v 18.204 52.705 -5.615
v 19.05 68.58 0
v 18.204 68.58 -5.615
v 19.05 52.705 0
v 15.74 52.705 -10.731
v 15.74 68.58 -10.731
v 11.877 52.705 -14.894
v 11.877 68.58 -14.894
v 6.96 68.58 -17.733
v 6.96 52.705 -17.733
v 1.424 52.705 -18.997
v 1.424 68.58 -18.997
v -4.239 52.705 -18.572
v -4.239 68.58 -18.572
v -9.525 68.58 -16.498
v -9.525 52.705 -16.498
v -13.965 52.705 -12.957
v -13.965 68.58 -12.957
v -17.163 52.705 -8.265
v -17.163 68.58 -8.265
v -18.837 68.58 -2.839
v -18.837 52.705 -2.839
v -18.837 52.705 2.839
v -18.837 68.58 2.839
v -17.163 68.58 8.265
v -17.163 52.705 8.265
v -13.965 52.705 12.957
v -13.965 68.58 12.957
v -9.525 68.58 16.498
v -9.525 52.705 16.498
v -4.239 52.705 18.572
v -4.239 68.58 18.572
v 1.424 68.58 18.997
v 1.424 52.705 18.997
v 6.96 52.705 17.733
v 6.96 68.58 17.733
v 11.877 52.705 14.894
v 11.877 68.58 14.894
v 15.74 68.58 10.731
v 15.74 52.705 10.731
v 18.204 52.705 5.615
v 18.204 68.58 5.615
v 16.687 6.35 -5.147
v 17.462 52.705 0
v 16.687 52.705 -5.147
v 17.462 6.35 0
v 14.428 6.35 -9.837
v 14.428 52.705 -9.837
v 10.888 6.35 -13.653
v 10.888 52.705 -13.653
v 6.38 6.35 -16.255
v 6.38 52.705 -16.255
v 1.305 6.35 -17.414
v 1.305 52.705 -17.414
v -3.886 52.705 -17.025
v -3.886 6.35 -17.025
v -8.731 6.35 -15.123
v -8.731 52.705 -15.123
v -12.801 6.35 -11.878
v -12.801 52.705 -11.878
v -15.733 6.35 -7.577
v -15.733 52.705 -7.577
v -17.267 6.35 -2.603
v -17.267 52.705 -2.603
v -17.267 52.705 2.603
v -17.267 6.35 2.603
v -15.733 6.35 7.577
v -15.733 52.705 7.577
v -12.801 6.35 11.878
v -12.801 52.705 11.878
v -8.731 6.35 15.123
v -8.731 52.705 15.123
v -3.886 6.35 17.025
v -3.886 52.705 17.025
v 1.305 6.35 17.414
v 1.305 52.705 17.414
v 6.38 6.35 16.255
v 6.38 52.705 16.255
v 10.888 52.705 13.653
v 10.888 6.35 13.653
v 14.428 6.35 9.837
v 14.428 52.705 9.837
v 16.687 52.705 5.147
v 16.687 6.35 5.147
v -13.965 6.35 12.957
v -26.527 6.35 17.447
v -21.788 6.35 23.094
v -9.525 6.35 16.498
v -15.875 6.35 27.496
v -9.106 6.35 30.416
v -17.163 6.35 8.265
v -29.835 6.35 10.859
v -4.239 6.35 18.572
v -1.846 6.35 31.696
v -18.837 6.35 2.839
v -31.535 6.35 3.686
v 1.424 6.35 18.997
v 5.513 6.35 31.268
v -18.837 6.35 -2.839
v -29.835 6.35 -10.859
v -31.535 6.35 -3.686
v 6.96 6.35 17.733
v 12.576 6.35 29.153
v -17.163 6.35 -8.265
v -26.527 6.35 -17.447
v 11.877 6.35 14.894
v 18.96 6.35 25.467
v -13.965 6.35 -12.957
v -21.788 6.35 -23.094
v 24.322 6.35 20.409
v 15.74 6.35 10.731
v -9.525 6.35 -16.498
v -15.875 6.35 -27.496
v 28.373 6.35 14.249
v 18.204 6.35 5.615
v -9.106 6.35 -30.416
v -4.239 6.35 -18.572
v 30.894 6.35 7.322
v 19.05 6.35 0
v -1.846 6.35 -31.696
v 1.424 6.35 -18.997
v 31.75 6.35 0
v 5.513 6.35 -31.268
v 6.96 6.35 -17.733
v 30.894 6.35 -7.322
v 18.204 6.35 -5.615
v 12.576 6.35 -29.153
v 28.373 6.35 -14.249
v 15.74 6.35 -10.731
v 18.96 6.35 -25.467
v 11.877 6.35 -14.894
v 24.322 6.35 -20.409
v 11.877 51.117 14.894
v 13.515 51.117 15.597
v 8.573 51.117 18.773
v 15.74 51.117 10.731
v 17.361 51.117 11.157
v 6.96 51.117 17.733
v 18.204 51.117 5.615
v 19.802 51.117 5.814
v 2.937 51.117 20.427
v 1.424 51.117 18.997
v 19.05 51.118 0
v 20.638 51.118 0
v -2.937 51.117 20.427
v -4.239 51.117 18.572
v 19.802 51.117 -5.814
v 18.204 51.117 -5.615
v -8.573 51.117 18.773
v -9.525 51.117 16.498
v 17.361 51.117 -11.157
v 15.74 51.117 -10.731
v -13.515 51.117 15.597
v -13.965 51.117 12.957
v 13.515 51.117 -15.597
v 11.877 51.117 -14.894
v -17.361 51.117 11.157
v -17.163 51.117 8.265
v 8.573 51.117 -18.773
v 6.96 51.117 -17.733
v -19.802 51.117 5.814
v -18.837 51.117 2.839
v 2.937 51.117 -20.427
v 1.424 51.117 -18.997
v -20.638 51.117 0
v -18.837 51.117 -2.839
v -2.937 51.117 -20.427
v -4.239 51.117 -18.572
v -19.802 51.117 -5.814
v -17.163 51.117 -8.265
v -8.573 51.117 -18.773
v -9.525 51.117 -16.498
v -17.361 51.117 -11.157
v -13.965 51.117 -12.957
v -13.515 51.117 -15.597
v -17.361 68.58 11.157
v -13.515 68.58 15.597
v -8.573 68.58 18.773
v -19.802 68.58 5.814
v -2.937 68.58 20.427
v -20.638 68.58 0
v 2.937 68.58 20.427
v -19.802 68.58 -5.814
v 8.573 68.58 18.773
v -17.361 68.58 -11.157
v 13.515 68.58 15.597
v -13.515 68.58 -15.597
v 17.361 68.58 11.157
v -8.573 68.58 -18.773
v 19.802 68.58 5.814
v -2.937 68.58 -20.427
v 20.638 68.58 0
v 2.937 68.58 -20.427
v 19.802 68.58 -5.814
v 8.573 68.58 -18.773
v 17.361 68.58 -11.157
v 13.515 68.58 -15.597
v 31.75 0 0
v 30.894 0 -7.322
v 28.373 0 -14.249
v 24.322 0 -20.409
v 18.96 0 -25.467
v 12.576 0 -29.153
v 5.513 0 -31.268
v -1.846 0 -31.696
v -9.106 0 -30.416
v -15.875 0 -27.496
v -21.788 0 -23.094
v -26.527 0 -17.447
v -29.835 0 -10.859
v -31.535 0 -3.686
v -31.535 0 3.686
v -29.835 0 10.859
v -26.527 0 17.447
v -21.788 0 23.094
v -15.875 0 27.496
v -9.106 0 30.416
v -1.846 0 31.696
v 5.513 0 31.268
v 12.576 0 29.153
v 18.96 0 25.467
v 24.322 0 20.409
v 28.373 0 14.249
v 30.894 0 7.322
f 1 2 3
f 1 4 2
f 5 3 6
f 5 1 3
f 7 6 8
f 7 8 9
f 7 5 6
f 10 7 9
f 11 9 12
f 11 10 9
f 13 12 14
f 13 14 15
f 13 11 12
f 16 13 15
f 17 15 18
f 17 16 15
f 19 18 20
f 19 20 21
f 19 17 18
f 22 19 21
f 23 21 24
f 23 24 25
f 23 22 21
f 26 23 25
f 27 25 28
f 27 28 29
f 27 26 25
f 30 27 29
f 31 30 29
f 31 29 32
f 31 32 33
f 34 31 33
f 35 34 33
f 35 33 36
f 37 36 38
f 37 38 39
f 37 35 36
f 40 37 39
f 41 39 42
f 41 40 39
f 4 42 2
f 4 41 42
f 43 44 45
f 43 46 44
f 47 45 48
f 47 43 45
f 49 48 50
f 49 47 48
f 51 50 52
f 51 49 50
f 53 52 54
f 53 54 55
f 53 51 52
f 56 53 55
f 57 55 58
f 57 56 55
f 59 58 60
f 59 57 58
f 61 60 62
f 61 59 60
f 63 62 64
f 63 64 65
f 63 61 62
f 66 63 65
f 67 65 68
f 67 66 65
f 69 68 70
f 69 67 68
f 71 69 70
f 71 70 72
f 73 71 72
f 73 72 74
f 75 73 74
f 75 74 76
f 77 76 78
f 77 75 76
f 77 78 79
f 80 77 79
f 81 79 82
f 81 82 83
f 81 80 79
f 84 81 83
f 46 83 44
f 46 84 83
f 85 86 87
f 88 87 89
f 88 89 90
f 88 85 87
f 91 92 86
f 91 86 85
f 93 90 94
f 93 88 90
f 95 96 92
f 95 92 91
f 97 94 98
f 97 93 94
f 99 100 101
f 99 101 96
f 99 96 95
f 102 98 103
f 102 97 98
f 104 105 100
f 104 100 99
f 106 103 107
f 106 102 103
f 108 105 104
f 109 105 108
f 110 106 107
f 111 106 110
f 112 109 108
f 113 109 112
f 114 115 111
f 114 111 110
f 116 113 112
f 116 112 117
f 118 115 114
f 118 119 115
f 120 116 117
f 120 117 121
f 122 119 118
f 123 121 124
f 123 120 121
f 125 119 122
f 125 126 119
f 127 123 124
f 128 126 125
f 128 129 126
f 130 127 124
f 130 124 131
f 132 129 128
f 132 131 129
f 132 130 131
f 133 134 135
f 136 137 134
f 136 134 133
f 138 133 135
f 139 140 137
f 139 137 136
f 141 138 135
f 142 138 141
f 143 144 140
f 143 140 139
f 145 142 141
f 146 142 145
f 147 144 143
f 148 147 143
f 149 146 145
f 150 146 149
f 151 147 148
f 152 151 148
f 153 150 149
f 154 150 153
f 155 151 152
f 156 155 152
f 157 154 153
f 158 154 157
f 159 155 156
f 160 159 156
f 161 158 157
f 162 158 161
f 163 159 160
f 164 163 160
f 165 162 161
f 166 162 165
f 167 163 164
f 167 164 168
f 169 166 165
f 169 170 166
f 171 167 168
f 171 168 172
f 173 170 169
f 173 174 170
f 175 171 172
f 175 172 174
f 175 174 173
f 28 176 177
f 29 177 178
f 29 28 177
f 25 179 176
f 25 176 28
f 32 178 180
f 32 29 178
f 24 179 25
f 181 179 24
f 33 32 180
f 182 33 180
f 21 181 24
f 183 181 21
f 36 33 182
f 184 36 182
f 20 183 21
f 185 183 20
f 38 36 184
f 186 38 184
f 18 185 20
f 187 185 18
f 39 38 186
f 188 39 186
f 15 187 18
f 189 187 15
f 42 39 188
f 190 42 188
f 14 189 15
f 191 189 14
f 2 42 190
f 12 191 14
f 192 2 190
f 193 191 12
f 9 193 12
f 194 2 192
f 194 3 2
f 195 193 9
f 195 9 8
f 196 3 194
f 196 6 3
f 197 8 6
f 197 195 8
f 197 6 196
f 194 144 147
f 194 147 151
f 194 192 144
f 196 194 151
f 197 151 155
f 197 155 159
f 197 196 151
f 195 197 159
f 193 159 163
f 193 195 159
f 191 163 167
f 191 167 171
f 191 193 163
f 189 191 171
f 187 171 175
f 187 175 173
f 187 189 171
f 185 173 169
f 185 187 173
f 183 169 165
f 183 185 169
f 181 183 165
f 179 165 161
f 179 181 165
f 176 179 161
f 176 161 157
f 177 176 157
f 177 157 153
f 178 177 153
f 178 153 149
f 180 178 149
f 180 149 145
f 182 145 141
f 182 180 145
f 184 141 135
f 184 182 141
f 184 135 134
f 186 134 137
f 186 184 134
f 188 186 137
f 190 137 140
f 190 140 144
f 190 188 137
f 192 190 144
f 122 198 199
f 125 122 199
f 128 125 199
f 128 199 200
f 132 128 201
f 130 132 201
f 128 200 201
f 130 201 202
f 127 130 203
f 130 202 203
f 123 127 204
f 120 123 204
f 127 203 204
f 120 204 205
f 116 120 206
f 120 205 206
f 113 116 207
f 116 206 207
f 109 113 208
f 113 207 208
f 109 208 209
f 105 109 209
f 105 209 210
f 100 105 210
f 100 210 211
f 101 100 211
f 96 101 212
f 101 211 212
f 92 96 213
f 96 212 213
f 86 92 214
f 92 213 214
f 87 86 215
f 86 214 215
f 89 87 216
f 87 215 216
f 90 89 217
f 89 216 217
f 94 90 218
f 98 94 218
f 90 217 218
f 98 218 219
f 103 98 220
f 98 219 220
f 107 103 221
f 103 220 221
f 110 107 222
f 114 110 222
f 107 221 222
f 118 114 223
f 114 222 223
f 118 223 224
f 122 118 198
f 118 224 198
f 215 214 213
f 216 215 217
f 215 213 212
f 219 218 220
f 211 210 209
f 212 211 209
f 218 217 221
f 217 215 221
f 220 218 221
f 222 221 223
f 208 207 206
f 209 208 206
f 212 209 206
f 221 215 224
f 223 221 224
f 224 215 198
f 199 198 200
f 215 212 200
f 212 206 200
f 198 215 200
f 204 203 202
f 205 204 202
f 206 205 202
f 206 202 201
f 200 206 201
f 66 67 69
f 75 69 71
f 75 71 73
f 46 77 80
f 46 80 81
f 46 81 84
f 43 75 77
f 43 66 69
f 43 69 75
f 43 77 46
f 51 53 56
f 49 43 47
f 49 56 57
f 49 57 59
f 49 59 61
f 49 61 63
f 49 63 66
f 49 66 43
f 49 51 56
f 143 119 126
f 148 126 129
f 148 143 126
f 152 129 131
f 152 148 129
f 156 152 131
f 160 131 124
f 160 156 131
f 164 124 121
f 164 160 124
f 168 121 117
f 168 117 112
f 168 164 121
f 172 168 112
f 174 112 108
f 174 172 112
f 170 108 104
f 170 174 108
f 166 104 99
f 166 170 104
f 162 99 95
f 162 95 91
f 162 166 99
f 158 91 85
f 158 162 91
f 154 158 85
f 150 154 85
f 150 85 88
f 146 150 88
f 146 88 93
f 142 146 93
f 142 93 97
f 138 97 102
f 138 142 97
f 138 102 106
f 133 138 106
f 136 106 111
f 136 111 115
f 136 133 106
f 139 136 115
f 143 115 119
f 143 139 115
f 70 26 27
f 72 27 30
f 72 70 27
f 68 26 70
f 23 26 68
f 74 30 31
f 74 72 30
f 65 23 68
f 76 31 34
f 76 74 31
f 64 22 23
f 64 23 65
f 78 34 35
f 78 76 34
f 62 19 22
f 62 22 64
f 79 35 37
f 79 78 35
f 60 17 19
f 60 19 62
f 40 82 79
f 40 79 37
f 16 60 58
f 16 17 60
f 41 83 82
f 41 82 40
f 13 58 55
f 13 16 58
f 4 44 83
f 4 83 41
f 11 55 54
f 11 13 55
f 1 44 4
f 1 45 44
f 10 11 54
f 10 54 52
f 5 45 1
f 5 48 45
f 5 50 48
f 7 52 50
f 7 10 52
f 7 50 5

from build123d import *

# Parameters (mm, degrees)
SKETCH1_R           = 31.75
BOSS_EXTRUDE1_DEPTH = 6.35


with BuildPart() as part:
    # Sketch1 → Boss-Extrude1 (new body)
    with BuildSketch(Plane(origin=(0, 0, 0), x_dir=(1, 0, 0), z_dir=(0, 1, 0))):
        Circle(SKETCH1_R)
    extrude(amount=BOSS_EXTRUDE1_DEPTH)

    # Sketch2 → Revolve1 (revolve)
    with BuildSketch(Plane.XY):
        Polygon((19.05, 6.35), (19.05, 51.1175), (20.6375, 51.1175), (20.6375, 68.58), (19.05, 68.58), (19.05, 52.705), (17.4625, 52.705), (17.4625, 6.35), align=None)
    revolve(axis=Axis((0, -26.067472827, 0), (0, 1, 0)))


solid = part.part
